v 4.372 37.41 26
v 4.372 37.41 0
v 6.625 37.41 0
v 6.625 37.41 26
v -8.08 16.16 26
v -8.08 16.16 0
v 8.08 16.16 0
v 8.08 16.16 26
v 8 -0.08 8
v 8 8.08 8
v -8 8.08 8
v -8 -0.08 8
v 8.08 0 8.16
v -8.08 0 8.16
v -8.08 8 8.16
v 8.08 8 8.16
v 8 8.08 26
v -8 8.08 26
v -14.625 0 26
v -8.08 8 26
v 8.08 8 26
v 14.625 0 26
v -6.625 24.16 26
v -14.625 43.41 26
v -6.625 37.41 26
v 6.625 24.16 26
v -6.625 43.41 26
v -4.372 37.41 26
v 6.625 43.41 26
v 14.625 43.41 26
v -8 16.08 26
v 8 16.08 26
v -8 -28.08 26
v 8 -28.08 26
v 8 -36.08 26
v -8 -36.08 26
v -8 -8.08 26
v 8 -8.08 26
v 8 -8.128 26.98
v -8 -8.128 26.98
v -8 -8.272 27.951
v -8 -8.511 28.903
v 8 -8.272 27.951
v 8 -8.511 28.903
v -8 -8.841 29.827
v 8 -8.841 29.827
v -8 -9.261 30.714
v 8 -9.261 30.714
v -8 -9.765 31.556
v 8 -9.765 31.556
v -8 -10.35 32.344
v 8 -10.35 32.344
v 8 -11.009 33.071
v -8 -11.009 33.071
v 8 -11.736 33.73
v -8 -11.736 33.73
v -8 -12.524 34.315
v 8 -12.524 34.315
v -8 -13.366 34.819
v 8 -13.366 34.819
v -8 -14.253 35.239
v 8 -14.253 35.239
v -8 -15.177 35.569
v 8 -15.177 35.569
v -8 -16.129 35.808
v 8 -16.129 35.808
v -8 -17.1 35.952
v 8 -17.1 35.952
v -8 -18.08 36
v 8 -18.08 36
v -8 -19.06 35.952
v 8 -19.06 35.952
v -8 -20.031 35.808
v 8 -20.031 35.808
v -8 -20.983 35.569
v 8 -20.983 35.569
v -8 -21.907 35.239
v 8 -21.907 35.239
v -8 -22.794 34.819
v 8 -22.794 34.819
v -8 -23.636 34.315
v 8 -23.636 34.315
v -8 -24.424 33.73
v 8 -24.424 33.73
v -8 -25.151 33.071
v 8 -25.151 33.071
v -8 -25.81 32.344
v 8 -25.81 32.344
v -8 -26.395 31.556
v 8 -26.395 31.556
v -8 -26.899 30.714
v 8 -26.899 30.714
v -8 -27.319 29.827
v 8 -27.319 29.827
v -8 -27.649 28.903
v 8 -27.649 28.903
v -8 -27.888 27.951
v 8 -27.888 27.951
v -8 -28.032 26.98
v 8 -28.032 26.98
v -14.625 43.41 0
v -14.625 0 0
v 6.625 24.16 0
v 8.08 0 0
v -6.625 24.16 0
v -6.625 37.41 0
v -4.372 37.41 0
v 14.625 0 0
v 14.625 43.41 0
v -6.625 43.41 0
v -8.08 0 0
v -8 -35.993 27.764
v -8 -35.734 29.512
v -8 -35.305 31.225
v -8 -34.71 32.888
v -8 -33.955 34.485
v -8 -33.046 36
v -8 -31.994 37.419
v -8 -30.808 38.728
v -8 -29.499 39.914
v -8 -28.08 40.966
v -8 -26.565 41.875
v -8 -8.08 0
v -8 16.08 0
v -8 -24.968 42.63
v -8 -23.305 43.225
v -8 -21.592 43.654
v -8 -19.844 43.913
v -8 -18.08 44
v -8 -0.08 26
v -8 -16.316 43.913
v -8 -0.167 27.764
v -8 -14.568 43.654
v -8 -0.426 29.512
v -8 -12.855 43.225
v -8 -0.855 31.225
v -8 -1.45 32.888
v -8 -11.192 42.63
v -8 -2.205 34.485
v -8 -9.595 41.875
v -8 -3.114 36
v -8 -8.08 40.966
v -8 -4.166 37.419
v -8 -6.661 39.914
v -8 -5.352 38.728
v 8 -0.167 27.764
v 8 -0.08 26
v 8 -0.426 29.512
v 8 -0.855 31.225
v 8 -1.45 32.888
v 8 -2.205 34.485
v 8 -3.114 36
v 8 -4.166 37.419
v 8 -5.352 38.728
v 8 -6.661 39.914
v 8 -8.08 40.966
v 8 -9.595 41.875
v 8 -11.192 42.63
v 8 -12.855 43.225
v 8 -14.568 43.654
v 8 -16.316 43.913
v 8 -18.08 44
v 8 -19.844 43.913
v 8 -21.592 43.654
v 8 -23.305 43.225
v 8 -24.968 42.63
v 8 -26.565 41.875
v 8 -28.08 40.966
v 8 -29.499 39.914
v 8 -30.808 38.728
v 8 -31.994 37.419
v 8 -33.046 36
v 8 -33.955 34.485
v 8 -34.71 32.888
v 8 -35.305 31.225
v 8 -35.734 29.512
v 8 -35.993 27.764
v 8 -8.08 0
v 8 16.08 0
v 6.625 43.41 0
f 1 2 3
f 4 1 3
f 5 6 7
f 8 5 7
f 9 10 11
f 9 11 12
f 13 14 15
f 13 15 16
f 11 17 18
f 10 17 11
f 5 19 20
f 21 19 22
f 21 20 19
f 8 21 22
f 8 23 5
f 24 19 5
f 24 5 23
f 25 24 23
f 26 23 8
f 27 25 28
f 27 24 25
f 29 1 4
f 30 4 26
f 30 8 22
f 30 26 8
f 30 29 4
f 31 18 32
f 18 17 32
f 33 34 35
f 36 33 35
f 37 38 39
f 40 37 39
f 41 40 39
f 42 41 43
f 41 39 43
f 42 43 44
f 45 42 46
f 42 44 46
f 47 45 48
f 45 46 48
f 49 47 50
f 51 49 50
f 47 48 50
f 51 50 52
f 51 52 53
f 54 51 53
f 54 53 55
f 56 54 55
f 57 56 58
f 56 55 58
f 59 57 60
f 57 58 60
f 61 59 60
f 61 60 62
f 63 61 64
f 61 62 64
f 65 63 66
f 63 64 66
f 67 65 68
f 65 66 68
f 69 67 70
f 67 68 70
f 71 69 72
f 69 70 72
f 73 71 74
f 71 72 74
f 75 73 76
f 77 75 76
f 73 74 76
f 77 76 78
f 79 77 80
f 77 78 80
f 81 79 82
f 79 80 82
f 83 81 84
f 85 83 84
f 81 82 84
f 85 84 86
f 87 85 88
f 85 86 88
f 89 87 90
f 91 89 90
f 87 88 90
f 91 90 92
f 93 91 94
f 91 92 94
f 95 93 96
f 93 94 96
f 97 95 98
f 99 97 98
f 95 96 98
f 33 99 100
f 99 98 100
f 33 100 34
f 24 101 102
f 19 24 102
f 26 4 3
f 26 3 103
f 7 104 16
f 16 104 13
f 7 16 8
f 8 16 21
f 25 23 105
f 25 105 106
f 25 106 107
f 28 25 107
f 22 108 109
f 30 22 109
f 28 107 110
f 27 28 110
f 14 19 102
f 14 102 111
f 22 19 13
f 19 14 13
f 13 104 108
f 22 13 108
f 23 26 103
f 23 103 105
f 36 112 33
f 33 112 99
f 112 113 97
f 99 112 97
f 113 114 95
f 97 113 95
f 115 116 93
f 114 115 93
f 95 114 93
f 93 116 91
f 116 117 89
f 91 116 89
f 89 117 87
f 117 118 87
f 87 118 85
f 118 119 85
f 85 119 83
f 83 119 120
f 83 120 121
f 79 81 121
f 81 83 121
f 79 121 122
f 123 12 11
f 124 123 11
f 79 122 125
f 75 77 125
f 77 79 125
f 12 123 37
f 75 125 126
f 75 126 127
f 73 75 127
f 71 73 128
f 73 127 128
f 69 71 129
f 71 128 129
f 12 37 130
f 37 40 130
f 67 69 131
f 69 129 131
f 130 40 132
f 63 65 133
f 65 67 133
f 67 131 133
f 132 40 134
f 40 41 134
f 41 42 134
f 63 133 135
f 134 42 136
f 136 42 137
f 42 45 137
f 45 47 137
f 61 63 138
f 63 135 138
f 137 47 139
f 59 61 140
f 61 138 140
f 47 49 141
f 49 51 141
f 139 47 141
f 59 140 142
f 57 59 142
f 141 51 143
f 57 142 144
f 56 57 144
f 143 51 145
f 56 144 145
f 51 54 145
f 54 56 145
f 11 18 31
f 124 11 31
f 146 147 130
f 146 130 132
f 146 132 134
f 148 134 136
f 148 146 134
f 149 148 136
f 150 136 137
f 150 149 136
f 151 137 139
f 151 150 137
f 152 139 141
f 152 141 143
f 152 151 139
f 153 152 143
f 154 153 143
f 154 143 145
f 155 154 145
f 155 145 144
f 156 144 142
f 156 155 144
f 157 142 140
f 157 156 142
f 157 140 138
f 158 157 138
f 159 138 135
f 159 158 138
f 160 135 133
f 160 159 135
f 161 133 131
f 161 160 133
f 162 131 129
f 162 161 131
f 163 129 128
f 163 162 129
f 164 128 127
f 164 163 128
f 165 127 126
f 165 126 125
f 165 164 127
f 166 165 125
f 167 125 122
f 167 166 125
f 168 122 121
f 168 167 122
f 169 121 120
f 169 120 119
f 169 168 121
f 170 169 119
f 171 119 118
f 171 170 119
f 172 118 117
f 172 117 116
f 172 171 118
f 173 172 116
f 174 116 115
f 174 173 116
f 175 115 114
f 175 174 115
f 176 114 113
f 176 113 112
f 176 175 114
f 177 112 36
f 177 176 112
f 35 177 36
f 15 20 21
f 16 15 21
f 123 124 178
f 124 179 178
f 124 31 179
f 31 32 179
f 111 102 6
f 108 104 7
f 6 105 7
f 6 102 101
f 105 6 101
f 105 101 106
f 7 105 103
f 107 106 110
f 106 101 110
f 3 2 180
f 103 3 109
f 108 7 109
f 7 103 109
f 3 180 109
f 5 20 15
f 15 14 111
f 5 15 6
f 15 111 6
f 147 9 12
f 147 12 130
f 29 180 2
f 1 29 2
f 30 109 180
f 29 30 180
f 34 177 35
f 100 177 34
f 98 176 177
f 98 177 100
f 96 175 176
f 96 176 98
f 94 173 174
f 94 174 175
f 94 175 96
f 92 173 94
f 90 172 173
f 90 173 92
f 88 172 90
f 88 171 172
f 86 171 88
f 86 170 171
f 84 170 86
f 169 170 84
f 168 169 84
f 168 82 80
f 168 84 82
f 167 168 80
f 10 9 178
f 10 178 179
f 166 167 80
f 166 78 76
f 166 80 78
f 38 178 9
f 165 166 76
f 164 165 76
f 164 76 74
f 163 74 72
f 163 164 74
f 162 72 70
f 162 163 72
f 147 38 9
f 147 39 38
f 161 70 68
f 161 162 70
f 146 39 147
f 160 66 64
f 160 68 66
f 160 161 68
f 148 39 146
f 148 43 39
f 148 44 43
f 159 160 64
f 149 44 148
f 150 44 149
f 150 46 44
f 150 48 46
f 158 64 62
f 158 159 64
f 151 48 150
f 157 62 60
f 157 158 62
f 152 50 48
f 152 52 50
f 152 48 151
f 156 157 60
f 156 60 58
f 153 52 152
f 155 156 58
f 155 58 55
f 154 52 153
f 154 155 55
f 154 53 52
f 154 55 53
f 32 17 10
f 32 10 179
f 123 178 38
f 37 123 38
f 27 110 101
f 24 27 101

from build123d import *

# Parameters (mm, degrees)
SKETCH_W     = 16.16
SKETCH_H     = 8.16
PAD_DEPTH    = 26
SKETCH001_W  = 16.16
SKETCH001_H  = 8.16
POCKET_DEPTH = 8
PAD001_DEPTH = 8


with BuildPart() as mainbody:
    # Sketch → Pad (new body)
    with BuildSketch(Plane.XY):
        Polygon((-4.3725, 37.41), (-6.625, 43.41), (-14.625, 43.41), (-14.625, 0), (14.625, 0), (14.625, 43.41), (6.625, 43.41), (4.3725, 37.41), (6.625, 37.41), (6.625, 24.16), (-6.625, 24.16), (-6.625, 37.41), align=None)
        with Locations((0, 12.08)):
            Rectangle(SKETCH_W, SKETCH_H, mode=Mode.SUBTRACT)
    extrude(amount=PAD_DEPTH)

    # Sketch001 (on Face4 of Pad) → Pocket (cut)
    with BuildSketch(Plane.XZ):
        with Locations((0, 4.08)):
            Rectangle(SKETCH001_W, SKETCH001_H)
    extrude(amount=-POCKET_DEPTH, mode=Mode.SUBTRACT)


with BuildPart() as hookbody:
    # Sketch002 → Pad001 (new body, symmetric)
    with BuildSketch(Plane.YZ):
        with BuildLine():
            Line((8.08, 26), (8.08, 8))
            Line((8.08, 8), (-0.08, 8))
            Line((-0.08, 8), (-0.08, 26))
            ThreePointArc((-0.08, 26), (-18.08, 44), (-36.08, 26))
            Line((-28.08, 26), (-36.08, 26))
            ThreePointArc((-8.08, 26), (-18.08, 36), (-28.08, 26))
            Line((-8.08, 0), (-8.08, 26))
            Line((16.08, 0), (-8.08, 0))
            Line((16.08, 26), (16.08, 0))
            Line((8.08, 26), (16.08, 26))
        make_face()
    extrude(amount=PAD001_DEPTH, both=True)


solid = Compound([mainbody.part, hookbody.part])
